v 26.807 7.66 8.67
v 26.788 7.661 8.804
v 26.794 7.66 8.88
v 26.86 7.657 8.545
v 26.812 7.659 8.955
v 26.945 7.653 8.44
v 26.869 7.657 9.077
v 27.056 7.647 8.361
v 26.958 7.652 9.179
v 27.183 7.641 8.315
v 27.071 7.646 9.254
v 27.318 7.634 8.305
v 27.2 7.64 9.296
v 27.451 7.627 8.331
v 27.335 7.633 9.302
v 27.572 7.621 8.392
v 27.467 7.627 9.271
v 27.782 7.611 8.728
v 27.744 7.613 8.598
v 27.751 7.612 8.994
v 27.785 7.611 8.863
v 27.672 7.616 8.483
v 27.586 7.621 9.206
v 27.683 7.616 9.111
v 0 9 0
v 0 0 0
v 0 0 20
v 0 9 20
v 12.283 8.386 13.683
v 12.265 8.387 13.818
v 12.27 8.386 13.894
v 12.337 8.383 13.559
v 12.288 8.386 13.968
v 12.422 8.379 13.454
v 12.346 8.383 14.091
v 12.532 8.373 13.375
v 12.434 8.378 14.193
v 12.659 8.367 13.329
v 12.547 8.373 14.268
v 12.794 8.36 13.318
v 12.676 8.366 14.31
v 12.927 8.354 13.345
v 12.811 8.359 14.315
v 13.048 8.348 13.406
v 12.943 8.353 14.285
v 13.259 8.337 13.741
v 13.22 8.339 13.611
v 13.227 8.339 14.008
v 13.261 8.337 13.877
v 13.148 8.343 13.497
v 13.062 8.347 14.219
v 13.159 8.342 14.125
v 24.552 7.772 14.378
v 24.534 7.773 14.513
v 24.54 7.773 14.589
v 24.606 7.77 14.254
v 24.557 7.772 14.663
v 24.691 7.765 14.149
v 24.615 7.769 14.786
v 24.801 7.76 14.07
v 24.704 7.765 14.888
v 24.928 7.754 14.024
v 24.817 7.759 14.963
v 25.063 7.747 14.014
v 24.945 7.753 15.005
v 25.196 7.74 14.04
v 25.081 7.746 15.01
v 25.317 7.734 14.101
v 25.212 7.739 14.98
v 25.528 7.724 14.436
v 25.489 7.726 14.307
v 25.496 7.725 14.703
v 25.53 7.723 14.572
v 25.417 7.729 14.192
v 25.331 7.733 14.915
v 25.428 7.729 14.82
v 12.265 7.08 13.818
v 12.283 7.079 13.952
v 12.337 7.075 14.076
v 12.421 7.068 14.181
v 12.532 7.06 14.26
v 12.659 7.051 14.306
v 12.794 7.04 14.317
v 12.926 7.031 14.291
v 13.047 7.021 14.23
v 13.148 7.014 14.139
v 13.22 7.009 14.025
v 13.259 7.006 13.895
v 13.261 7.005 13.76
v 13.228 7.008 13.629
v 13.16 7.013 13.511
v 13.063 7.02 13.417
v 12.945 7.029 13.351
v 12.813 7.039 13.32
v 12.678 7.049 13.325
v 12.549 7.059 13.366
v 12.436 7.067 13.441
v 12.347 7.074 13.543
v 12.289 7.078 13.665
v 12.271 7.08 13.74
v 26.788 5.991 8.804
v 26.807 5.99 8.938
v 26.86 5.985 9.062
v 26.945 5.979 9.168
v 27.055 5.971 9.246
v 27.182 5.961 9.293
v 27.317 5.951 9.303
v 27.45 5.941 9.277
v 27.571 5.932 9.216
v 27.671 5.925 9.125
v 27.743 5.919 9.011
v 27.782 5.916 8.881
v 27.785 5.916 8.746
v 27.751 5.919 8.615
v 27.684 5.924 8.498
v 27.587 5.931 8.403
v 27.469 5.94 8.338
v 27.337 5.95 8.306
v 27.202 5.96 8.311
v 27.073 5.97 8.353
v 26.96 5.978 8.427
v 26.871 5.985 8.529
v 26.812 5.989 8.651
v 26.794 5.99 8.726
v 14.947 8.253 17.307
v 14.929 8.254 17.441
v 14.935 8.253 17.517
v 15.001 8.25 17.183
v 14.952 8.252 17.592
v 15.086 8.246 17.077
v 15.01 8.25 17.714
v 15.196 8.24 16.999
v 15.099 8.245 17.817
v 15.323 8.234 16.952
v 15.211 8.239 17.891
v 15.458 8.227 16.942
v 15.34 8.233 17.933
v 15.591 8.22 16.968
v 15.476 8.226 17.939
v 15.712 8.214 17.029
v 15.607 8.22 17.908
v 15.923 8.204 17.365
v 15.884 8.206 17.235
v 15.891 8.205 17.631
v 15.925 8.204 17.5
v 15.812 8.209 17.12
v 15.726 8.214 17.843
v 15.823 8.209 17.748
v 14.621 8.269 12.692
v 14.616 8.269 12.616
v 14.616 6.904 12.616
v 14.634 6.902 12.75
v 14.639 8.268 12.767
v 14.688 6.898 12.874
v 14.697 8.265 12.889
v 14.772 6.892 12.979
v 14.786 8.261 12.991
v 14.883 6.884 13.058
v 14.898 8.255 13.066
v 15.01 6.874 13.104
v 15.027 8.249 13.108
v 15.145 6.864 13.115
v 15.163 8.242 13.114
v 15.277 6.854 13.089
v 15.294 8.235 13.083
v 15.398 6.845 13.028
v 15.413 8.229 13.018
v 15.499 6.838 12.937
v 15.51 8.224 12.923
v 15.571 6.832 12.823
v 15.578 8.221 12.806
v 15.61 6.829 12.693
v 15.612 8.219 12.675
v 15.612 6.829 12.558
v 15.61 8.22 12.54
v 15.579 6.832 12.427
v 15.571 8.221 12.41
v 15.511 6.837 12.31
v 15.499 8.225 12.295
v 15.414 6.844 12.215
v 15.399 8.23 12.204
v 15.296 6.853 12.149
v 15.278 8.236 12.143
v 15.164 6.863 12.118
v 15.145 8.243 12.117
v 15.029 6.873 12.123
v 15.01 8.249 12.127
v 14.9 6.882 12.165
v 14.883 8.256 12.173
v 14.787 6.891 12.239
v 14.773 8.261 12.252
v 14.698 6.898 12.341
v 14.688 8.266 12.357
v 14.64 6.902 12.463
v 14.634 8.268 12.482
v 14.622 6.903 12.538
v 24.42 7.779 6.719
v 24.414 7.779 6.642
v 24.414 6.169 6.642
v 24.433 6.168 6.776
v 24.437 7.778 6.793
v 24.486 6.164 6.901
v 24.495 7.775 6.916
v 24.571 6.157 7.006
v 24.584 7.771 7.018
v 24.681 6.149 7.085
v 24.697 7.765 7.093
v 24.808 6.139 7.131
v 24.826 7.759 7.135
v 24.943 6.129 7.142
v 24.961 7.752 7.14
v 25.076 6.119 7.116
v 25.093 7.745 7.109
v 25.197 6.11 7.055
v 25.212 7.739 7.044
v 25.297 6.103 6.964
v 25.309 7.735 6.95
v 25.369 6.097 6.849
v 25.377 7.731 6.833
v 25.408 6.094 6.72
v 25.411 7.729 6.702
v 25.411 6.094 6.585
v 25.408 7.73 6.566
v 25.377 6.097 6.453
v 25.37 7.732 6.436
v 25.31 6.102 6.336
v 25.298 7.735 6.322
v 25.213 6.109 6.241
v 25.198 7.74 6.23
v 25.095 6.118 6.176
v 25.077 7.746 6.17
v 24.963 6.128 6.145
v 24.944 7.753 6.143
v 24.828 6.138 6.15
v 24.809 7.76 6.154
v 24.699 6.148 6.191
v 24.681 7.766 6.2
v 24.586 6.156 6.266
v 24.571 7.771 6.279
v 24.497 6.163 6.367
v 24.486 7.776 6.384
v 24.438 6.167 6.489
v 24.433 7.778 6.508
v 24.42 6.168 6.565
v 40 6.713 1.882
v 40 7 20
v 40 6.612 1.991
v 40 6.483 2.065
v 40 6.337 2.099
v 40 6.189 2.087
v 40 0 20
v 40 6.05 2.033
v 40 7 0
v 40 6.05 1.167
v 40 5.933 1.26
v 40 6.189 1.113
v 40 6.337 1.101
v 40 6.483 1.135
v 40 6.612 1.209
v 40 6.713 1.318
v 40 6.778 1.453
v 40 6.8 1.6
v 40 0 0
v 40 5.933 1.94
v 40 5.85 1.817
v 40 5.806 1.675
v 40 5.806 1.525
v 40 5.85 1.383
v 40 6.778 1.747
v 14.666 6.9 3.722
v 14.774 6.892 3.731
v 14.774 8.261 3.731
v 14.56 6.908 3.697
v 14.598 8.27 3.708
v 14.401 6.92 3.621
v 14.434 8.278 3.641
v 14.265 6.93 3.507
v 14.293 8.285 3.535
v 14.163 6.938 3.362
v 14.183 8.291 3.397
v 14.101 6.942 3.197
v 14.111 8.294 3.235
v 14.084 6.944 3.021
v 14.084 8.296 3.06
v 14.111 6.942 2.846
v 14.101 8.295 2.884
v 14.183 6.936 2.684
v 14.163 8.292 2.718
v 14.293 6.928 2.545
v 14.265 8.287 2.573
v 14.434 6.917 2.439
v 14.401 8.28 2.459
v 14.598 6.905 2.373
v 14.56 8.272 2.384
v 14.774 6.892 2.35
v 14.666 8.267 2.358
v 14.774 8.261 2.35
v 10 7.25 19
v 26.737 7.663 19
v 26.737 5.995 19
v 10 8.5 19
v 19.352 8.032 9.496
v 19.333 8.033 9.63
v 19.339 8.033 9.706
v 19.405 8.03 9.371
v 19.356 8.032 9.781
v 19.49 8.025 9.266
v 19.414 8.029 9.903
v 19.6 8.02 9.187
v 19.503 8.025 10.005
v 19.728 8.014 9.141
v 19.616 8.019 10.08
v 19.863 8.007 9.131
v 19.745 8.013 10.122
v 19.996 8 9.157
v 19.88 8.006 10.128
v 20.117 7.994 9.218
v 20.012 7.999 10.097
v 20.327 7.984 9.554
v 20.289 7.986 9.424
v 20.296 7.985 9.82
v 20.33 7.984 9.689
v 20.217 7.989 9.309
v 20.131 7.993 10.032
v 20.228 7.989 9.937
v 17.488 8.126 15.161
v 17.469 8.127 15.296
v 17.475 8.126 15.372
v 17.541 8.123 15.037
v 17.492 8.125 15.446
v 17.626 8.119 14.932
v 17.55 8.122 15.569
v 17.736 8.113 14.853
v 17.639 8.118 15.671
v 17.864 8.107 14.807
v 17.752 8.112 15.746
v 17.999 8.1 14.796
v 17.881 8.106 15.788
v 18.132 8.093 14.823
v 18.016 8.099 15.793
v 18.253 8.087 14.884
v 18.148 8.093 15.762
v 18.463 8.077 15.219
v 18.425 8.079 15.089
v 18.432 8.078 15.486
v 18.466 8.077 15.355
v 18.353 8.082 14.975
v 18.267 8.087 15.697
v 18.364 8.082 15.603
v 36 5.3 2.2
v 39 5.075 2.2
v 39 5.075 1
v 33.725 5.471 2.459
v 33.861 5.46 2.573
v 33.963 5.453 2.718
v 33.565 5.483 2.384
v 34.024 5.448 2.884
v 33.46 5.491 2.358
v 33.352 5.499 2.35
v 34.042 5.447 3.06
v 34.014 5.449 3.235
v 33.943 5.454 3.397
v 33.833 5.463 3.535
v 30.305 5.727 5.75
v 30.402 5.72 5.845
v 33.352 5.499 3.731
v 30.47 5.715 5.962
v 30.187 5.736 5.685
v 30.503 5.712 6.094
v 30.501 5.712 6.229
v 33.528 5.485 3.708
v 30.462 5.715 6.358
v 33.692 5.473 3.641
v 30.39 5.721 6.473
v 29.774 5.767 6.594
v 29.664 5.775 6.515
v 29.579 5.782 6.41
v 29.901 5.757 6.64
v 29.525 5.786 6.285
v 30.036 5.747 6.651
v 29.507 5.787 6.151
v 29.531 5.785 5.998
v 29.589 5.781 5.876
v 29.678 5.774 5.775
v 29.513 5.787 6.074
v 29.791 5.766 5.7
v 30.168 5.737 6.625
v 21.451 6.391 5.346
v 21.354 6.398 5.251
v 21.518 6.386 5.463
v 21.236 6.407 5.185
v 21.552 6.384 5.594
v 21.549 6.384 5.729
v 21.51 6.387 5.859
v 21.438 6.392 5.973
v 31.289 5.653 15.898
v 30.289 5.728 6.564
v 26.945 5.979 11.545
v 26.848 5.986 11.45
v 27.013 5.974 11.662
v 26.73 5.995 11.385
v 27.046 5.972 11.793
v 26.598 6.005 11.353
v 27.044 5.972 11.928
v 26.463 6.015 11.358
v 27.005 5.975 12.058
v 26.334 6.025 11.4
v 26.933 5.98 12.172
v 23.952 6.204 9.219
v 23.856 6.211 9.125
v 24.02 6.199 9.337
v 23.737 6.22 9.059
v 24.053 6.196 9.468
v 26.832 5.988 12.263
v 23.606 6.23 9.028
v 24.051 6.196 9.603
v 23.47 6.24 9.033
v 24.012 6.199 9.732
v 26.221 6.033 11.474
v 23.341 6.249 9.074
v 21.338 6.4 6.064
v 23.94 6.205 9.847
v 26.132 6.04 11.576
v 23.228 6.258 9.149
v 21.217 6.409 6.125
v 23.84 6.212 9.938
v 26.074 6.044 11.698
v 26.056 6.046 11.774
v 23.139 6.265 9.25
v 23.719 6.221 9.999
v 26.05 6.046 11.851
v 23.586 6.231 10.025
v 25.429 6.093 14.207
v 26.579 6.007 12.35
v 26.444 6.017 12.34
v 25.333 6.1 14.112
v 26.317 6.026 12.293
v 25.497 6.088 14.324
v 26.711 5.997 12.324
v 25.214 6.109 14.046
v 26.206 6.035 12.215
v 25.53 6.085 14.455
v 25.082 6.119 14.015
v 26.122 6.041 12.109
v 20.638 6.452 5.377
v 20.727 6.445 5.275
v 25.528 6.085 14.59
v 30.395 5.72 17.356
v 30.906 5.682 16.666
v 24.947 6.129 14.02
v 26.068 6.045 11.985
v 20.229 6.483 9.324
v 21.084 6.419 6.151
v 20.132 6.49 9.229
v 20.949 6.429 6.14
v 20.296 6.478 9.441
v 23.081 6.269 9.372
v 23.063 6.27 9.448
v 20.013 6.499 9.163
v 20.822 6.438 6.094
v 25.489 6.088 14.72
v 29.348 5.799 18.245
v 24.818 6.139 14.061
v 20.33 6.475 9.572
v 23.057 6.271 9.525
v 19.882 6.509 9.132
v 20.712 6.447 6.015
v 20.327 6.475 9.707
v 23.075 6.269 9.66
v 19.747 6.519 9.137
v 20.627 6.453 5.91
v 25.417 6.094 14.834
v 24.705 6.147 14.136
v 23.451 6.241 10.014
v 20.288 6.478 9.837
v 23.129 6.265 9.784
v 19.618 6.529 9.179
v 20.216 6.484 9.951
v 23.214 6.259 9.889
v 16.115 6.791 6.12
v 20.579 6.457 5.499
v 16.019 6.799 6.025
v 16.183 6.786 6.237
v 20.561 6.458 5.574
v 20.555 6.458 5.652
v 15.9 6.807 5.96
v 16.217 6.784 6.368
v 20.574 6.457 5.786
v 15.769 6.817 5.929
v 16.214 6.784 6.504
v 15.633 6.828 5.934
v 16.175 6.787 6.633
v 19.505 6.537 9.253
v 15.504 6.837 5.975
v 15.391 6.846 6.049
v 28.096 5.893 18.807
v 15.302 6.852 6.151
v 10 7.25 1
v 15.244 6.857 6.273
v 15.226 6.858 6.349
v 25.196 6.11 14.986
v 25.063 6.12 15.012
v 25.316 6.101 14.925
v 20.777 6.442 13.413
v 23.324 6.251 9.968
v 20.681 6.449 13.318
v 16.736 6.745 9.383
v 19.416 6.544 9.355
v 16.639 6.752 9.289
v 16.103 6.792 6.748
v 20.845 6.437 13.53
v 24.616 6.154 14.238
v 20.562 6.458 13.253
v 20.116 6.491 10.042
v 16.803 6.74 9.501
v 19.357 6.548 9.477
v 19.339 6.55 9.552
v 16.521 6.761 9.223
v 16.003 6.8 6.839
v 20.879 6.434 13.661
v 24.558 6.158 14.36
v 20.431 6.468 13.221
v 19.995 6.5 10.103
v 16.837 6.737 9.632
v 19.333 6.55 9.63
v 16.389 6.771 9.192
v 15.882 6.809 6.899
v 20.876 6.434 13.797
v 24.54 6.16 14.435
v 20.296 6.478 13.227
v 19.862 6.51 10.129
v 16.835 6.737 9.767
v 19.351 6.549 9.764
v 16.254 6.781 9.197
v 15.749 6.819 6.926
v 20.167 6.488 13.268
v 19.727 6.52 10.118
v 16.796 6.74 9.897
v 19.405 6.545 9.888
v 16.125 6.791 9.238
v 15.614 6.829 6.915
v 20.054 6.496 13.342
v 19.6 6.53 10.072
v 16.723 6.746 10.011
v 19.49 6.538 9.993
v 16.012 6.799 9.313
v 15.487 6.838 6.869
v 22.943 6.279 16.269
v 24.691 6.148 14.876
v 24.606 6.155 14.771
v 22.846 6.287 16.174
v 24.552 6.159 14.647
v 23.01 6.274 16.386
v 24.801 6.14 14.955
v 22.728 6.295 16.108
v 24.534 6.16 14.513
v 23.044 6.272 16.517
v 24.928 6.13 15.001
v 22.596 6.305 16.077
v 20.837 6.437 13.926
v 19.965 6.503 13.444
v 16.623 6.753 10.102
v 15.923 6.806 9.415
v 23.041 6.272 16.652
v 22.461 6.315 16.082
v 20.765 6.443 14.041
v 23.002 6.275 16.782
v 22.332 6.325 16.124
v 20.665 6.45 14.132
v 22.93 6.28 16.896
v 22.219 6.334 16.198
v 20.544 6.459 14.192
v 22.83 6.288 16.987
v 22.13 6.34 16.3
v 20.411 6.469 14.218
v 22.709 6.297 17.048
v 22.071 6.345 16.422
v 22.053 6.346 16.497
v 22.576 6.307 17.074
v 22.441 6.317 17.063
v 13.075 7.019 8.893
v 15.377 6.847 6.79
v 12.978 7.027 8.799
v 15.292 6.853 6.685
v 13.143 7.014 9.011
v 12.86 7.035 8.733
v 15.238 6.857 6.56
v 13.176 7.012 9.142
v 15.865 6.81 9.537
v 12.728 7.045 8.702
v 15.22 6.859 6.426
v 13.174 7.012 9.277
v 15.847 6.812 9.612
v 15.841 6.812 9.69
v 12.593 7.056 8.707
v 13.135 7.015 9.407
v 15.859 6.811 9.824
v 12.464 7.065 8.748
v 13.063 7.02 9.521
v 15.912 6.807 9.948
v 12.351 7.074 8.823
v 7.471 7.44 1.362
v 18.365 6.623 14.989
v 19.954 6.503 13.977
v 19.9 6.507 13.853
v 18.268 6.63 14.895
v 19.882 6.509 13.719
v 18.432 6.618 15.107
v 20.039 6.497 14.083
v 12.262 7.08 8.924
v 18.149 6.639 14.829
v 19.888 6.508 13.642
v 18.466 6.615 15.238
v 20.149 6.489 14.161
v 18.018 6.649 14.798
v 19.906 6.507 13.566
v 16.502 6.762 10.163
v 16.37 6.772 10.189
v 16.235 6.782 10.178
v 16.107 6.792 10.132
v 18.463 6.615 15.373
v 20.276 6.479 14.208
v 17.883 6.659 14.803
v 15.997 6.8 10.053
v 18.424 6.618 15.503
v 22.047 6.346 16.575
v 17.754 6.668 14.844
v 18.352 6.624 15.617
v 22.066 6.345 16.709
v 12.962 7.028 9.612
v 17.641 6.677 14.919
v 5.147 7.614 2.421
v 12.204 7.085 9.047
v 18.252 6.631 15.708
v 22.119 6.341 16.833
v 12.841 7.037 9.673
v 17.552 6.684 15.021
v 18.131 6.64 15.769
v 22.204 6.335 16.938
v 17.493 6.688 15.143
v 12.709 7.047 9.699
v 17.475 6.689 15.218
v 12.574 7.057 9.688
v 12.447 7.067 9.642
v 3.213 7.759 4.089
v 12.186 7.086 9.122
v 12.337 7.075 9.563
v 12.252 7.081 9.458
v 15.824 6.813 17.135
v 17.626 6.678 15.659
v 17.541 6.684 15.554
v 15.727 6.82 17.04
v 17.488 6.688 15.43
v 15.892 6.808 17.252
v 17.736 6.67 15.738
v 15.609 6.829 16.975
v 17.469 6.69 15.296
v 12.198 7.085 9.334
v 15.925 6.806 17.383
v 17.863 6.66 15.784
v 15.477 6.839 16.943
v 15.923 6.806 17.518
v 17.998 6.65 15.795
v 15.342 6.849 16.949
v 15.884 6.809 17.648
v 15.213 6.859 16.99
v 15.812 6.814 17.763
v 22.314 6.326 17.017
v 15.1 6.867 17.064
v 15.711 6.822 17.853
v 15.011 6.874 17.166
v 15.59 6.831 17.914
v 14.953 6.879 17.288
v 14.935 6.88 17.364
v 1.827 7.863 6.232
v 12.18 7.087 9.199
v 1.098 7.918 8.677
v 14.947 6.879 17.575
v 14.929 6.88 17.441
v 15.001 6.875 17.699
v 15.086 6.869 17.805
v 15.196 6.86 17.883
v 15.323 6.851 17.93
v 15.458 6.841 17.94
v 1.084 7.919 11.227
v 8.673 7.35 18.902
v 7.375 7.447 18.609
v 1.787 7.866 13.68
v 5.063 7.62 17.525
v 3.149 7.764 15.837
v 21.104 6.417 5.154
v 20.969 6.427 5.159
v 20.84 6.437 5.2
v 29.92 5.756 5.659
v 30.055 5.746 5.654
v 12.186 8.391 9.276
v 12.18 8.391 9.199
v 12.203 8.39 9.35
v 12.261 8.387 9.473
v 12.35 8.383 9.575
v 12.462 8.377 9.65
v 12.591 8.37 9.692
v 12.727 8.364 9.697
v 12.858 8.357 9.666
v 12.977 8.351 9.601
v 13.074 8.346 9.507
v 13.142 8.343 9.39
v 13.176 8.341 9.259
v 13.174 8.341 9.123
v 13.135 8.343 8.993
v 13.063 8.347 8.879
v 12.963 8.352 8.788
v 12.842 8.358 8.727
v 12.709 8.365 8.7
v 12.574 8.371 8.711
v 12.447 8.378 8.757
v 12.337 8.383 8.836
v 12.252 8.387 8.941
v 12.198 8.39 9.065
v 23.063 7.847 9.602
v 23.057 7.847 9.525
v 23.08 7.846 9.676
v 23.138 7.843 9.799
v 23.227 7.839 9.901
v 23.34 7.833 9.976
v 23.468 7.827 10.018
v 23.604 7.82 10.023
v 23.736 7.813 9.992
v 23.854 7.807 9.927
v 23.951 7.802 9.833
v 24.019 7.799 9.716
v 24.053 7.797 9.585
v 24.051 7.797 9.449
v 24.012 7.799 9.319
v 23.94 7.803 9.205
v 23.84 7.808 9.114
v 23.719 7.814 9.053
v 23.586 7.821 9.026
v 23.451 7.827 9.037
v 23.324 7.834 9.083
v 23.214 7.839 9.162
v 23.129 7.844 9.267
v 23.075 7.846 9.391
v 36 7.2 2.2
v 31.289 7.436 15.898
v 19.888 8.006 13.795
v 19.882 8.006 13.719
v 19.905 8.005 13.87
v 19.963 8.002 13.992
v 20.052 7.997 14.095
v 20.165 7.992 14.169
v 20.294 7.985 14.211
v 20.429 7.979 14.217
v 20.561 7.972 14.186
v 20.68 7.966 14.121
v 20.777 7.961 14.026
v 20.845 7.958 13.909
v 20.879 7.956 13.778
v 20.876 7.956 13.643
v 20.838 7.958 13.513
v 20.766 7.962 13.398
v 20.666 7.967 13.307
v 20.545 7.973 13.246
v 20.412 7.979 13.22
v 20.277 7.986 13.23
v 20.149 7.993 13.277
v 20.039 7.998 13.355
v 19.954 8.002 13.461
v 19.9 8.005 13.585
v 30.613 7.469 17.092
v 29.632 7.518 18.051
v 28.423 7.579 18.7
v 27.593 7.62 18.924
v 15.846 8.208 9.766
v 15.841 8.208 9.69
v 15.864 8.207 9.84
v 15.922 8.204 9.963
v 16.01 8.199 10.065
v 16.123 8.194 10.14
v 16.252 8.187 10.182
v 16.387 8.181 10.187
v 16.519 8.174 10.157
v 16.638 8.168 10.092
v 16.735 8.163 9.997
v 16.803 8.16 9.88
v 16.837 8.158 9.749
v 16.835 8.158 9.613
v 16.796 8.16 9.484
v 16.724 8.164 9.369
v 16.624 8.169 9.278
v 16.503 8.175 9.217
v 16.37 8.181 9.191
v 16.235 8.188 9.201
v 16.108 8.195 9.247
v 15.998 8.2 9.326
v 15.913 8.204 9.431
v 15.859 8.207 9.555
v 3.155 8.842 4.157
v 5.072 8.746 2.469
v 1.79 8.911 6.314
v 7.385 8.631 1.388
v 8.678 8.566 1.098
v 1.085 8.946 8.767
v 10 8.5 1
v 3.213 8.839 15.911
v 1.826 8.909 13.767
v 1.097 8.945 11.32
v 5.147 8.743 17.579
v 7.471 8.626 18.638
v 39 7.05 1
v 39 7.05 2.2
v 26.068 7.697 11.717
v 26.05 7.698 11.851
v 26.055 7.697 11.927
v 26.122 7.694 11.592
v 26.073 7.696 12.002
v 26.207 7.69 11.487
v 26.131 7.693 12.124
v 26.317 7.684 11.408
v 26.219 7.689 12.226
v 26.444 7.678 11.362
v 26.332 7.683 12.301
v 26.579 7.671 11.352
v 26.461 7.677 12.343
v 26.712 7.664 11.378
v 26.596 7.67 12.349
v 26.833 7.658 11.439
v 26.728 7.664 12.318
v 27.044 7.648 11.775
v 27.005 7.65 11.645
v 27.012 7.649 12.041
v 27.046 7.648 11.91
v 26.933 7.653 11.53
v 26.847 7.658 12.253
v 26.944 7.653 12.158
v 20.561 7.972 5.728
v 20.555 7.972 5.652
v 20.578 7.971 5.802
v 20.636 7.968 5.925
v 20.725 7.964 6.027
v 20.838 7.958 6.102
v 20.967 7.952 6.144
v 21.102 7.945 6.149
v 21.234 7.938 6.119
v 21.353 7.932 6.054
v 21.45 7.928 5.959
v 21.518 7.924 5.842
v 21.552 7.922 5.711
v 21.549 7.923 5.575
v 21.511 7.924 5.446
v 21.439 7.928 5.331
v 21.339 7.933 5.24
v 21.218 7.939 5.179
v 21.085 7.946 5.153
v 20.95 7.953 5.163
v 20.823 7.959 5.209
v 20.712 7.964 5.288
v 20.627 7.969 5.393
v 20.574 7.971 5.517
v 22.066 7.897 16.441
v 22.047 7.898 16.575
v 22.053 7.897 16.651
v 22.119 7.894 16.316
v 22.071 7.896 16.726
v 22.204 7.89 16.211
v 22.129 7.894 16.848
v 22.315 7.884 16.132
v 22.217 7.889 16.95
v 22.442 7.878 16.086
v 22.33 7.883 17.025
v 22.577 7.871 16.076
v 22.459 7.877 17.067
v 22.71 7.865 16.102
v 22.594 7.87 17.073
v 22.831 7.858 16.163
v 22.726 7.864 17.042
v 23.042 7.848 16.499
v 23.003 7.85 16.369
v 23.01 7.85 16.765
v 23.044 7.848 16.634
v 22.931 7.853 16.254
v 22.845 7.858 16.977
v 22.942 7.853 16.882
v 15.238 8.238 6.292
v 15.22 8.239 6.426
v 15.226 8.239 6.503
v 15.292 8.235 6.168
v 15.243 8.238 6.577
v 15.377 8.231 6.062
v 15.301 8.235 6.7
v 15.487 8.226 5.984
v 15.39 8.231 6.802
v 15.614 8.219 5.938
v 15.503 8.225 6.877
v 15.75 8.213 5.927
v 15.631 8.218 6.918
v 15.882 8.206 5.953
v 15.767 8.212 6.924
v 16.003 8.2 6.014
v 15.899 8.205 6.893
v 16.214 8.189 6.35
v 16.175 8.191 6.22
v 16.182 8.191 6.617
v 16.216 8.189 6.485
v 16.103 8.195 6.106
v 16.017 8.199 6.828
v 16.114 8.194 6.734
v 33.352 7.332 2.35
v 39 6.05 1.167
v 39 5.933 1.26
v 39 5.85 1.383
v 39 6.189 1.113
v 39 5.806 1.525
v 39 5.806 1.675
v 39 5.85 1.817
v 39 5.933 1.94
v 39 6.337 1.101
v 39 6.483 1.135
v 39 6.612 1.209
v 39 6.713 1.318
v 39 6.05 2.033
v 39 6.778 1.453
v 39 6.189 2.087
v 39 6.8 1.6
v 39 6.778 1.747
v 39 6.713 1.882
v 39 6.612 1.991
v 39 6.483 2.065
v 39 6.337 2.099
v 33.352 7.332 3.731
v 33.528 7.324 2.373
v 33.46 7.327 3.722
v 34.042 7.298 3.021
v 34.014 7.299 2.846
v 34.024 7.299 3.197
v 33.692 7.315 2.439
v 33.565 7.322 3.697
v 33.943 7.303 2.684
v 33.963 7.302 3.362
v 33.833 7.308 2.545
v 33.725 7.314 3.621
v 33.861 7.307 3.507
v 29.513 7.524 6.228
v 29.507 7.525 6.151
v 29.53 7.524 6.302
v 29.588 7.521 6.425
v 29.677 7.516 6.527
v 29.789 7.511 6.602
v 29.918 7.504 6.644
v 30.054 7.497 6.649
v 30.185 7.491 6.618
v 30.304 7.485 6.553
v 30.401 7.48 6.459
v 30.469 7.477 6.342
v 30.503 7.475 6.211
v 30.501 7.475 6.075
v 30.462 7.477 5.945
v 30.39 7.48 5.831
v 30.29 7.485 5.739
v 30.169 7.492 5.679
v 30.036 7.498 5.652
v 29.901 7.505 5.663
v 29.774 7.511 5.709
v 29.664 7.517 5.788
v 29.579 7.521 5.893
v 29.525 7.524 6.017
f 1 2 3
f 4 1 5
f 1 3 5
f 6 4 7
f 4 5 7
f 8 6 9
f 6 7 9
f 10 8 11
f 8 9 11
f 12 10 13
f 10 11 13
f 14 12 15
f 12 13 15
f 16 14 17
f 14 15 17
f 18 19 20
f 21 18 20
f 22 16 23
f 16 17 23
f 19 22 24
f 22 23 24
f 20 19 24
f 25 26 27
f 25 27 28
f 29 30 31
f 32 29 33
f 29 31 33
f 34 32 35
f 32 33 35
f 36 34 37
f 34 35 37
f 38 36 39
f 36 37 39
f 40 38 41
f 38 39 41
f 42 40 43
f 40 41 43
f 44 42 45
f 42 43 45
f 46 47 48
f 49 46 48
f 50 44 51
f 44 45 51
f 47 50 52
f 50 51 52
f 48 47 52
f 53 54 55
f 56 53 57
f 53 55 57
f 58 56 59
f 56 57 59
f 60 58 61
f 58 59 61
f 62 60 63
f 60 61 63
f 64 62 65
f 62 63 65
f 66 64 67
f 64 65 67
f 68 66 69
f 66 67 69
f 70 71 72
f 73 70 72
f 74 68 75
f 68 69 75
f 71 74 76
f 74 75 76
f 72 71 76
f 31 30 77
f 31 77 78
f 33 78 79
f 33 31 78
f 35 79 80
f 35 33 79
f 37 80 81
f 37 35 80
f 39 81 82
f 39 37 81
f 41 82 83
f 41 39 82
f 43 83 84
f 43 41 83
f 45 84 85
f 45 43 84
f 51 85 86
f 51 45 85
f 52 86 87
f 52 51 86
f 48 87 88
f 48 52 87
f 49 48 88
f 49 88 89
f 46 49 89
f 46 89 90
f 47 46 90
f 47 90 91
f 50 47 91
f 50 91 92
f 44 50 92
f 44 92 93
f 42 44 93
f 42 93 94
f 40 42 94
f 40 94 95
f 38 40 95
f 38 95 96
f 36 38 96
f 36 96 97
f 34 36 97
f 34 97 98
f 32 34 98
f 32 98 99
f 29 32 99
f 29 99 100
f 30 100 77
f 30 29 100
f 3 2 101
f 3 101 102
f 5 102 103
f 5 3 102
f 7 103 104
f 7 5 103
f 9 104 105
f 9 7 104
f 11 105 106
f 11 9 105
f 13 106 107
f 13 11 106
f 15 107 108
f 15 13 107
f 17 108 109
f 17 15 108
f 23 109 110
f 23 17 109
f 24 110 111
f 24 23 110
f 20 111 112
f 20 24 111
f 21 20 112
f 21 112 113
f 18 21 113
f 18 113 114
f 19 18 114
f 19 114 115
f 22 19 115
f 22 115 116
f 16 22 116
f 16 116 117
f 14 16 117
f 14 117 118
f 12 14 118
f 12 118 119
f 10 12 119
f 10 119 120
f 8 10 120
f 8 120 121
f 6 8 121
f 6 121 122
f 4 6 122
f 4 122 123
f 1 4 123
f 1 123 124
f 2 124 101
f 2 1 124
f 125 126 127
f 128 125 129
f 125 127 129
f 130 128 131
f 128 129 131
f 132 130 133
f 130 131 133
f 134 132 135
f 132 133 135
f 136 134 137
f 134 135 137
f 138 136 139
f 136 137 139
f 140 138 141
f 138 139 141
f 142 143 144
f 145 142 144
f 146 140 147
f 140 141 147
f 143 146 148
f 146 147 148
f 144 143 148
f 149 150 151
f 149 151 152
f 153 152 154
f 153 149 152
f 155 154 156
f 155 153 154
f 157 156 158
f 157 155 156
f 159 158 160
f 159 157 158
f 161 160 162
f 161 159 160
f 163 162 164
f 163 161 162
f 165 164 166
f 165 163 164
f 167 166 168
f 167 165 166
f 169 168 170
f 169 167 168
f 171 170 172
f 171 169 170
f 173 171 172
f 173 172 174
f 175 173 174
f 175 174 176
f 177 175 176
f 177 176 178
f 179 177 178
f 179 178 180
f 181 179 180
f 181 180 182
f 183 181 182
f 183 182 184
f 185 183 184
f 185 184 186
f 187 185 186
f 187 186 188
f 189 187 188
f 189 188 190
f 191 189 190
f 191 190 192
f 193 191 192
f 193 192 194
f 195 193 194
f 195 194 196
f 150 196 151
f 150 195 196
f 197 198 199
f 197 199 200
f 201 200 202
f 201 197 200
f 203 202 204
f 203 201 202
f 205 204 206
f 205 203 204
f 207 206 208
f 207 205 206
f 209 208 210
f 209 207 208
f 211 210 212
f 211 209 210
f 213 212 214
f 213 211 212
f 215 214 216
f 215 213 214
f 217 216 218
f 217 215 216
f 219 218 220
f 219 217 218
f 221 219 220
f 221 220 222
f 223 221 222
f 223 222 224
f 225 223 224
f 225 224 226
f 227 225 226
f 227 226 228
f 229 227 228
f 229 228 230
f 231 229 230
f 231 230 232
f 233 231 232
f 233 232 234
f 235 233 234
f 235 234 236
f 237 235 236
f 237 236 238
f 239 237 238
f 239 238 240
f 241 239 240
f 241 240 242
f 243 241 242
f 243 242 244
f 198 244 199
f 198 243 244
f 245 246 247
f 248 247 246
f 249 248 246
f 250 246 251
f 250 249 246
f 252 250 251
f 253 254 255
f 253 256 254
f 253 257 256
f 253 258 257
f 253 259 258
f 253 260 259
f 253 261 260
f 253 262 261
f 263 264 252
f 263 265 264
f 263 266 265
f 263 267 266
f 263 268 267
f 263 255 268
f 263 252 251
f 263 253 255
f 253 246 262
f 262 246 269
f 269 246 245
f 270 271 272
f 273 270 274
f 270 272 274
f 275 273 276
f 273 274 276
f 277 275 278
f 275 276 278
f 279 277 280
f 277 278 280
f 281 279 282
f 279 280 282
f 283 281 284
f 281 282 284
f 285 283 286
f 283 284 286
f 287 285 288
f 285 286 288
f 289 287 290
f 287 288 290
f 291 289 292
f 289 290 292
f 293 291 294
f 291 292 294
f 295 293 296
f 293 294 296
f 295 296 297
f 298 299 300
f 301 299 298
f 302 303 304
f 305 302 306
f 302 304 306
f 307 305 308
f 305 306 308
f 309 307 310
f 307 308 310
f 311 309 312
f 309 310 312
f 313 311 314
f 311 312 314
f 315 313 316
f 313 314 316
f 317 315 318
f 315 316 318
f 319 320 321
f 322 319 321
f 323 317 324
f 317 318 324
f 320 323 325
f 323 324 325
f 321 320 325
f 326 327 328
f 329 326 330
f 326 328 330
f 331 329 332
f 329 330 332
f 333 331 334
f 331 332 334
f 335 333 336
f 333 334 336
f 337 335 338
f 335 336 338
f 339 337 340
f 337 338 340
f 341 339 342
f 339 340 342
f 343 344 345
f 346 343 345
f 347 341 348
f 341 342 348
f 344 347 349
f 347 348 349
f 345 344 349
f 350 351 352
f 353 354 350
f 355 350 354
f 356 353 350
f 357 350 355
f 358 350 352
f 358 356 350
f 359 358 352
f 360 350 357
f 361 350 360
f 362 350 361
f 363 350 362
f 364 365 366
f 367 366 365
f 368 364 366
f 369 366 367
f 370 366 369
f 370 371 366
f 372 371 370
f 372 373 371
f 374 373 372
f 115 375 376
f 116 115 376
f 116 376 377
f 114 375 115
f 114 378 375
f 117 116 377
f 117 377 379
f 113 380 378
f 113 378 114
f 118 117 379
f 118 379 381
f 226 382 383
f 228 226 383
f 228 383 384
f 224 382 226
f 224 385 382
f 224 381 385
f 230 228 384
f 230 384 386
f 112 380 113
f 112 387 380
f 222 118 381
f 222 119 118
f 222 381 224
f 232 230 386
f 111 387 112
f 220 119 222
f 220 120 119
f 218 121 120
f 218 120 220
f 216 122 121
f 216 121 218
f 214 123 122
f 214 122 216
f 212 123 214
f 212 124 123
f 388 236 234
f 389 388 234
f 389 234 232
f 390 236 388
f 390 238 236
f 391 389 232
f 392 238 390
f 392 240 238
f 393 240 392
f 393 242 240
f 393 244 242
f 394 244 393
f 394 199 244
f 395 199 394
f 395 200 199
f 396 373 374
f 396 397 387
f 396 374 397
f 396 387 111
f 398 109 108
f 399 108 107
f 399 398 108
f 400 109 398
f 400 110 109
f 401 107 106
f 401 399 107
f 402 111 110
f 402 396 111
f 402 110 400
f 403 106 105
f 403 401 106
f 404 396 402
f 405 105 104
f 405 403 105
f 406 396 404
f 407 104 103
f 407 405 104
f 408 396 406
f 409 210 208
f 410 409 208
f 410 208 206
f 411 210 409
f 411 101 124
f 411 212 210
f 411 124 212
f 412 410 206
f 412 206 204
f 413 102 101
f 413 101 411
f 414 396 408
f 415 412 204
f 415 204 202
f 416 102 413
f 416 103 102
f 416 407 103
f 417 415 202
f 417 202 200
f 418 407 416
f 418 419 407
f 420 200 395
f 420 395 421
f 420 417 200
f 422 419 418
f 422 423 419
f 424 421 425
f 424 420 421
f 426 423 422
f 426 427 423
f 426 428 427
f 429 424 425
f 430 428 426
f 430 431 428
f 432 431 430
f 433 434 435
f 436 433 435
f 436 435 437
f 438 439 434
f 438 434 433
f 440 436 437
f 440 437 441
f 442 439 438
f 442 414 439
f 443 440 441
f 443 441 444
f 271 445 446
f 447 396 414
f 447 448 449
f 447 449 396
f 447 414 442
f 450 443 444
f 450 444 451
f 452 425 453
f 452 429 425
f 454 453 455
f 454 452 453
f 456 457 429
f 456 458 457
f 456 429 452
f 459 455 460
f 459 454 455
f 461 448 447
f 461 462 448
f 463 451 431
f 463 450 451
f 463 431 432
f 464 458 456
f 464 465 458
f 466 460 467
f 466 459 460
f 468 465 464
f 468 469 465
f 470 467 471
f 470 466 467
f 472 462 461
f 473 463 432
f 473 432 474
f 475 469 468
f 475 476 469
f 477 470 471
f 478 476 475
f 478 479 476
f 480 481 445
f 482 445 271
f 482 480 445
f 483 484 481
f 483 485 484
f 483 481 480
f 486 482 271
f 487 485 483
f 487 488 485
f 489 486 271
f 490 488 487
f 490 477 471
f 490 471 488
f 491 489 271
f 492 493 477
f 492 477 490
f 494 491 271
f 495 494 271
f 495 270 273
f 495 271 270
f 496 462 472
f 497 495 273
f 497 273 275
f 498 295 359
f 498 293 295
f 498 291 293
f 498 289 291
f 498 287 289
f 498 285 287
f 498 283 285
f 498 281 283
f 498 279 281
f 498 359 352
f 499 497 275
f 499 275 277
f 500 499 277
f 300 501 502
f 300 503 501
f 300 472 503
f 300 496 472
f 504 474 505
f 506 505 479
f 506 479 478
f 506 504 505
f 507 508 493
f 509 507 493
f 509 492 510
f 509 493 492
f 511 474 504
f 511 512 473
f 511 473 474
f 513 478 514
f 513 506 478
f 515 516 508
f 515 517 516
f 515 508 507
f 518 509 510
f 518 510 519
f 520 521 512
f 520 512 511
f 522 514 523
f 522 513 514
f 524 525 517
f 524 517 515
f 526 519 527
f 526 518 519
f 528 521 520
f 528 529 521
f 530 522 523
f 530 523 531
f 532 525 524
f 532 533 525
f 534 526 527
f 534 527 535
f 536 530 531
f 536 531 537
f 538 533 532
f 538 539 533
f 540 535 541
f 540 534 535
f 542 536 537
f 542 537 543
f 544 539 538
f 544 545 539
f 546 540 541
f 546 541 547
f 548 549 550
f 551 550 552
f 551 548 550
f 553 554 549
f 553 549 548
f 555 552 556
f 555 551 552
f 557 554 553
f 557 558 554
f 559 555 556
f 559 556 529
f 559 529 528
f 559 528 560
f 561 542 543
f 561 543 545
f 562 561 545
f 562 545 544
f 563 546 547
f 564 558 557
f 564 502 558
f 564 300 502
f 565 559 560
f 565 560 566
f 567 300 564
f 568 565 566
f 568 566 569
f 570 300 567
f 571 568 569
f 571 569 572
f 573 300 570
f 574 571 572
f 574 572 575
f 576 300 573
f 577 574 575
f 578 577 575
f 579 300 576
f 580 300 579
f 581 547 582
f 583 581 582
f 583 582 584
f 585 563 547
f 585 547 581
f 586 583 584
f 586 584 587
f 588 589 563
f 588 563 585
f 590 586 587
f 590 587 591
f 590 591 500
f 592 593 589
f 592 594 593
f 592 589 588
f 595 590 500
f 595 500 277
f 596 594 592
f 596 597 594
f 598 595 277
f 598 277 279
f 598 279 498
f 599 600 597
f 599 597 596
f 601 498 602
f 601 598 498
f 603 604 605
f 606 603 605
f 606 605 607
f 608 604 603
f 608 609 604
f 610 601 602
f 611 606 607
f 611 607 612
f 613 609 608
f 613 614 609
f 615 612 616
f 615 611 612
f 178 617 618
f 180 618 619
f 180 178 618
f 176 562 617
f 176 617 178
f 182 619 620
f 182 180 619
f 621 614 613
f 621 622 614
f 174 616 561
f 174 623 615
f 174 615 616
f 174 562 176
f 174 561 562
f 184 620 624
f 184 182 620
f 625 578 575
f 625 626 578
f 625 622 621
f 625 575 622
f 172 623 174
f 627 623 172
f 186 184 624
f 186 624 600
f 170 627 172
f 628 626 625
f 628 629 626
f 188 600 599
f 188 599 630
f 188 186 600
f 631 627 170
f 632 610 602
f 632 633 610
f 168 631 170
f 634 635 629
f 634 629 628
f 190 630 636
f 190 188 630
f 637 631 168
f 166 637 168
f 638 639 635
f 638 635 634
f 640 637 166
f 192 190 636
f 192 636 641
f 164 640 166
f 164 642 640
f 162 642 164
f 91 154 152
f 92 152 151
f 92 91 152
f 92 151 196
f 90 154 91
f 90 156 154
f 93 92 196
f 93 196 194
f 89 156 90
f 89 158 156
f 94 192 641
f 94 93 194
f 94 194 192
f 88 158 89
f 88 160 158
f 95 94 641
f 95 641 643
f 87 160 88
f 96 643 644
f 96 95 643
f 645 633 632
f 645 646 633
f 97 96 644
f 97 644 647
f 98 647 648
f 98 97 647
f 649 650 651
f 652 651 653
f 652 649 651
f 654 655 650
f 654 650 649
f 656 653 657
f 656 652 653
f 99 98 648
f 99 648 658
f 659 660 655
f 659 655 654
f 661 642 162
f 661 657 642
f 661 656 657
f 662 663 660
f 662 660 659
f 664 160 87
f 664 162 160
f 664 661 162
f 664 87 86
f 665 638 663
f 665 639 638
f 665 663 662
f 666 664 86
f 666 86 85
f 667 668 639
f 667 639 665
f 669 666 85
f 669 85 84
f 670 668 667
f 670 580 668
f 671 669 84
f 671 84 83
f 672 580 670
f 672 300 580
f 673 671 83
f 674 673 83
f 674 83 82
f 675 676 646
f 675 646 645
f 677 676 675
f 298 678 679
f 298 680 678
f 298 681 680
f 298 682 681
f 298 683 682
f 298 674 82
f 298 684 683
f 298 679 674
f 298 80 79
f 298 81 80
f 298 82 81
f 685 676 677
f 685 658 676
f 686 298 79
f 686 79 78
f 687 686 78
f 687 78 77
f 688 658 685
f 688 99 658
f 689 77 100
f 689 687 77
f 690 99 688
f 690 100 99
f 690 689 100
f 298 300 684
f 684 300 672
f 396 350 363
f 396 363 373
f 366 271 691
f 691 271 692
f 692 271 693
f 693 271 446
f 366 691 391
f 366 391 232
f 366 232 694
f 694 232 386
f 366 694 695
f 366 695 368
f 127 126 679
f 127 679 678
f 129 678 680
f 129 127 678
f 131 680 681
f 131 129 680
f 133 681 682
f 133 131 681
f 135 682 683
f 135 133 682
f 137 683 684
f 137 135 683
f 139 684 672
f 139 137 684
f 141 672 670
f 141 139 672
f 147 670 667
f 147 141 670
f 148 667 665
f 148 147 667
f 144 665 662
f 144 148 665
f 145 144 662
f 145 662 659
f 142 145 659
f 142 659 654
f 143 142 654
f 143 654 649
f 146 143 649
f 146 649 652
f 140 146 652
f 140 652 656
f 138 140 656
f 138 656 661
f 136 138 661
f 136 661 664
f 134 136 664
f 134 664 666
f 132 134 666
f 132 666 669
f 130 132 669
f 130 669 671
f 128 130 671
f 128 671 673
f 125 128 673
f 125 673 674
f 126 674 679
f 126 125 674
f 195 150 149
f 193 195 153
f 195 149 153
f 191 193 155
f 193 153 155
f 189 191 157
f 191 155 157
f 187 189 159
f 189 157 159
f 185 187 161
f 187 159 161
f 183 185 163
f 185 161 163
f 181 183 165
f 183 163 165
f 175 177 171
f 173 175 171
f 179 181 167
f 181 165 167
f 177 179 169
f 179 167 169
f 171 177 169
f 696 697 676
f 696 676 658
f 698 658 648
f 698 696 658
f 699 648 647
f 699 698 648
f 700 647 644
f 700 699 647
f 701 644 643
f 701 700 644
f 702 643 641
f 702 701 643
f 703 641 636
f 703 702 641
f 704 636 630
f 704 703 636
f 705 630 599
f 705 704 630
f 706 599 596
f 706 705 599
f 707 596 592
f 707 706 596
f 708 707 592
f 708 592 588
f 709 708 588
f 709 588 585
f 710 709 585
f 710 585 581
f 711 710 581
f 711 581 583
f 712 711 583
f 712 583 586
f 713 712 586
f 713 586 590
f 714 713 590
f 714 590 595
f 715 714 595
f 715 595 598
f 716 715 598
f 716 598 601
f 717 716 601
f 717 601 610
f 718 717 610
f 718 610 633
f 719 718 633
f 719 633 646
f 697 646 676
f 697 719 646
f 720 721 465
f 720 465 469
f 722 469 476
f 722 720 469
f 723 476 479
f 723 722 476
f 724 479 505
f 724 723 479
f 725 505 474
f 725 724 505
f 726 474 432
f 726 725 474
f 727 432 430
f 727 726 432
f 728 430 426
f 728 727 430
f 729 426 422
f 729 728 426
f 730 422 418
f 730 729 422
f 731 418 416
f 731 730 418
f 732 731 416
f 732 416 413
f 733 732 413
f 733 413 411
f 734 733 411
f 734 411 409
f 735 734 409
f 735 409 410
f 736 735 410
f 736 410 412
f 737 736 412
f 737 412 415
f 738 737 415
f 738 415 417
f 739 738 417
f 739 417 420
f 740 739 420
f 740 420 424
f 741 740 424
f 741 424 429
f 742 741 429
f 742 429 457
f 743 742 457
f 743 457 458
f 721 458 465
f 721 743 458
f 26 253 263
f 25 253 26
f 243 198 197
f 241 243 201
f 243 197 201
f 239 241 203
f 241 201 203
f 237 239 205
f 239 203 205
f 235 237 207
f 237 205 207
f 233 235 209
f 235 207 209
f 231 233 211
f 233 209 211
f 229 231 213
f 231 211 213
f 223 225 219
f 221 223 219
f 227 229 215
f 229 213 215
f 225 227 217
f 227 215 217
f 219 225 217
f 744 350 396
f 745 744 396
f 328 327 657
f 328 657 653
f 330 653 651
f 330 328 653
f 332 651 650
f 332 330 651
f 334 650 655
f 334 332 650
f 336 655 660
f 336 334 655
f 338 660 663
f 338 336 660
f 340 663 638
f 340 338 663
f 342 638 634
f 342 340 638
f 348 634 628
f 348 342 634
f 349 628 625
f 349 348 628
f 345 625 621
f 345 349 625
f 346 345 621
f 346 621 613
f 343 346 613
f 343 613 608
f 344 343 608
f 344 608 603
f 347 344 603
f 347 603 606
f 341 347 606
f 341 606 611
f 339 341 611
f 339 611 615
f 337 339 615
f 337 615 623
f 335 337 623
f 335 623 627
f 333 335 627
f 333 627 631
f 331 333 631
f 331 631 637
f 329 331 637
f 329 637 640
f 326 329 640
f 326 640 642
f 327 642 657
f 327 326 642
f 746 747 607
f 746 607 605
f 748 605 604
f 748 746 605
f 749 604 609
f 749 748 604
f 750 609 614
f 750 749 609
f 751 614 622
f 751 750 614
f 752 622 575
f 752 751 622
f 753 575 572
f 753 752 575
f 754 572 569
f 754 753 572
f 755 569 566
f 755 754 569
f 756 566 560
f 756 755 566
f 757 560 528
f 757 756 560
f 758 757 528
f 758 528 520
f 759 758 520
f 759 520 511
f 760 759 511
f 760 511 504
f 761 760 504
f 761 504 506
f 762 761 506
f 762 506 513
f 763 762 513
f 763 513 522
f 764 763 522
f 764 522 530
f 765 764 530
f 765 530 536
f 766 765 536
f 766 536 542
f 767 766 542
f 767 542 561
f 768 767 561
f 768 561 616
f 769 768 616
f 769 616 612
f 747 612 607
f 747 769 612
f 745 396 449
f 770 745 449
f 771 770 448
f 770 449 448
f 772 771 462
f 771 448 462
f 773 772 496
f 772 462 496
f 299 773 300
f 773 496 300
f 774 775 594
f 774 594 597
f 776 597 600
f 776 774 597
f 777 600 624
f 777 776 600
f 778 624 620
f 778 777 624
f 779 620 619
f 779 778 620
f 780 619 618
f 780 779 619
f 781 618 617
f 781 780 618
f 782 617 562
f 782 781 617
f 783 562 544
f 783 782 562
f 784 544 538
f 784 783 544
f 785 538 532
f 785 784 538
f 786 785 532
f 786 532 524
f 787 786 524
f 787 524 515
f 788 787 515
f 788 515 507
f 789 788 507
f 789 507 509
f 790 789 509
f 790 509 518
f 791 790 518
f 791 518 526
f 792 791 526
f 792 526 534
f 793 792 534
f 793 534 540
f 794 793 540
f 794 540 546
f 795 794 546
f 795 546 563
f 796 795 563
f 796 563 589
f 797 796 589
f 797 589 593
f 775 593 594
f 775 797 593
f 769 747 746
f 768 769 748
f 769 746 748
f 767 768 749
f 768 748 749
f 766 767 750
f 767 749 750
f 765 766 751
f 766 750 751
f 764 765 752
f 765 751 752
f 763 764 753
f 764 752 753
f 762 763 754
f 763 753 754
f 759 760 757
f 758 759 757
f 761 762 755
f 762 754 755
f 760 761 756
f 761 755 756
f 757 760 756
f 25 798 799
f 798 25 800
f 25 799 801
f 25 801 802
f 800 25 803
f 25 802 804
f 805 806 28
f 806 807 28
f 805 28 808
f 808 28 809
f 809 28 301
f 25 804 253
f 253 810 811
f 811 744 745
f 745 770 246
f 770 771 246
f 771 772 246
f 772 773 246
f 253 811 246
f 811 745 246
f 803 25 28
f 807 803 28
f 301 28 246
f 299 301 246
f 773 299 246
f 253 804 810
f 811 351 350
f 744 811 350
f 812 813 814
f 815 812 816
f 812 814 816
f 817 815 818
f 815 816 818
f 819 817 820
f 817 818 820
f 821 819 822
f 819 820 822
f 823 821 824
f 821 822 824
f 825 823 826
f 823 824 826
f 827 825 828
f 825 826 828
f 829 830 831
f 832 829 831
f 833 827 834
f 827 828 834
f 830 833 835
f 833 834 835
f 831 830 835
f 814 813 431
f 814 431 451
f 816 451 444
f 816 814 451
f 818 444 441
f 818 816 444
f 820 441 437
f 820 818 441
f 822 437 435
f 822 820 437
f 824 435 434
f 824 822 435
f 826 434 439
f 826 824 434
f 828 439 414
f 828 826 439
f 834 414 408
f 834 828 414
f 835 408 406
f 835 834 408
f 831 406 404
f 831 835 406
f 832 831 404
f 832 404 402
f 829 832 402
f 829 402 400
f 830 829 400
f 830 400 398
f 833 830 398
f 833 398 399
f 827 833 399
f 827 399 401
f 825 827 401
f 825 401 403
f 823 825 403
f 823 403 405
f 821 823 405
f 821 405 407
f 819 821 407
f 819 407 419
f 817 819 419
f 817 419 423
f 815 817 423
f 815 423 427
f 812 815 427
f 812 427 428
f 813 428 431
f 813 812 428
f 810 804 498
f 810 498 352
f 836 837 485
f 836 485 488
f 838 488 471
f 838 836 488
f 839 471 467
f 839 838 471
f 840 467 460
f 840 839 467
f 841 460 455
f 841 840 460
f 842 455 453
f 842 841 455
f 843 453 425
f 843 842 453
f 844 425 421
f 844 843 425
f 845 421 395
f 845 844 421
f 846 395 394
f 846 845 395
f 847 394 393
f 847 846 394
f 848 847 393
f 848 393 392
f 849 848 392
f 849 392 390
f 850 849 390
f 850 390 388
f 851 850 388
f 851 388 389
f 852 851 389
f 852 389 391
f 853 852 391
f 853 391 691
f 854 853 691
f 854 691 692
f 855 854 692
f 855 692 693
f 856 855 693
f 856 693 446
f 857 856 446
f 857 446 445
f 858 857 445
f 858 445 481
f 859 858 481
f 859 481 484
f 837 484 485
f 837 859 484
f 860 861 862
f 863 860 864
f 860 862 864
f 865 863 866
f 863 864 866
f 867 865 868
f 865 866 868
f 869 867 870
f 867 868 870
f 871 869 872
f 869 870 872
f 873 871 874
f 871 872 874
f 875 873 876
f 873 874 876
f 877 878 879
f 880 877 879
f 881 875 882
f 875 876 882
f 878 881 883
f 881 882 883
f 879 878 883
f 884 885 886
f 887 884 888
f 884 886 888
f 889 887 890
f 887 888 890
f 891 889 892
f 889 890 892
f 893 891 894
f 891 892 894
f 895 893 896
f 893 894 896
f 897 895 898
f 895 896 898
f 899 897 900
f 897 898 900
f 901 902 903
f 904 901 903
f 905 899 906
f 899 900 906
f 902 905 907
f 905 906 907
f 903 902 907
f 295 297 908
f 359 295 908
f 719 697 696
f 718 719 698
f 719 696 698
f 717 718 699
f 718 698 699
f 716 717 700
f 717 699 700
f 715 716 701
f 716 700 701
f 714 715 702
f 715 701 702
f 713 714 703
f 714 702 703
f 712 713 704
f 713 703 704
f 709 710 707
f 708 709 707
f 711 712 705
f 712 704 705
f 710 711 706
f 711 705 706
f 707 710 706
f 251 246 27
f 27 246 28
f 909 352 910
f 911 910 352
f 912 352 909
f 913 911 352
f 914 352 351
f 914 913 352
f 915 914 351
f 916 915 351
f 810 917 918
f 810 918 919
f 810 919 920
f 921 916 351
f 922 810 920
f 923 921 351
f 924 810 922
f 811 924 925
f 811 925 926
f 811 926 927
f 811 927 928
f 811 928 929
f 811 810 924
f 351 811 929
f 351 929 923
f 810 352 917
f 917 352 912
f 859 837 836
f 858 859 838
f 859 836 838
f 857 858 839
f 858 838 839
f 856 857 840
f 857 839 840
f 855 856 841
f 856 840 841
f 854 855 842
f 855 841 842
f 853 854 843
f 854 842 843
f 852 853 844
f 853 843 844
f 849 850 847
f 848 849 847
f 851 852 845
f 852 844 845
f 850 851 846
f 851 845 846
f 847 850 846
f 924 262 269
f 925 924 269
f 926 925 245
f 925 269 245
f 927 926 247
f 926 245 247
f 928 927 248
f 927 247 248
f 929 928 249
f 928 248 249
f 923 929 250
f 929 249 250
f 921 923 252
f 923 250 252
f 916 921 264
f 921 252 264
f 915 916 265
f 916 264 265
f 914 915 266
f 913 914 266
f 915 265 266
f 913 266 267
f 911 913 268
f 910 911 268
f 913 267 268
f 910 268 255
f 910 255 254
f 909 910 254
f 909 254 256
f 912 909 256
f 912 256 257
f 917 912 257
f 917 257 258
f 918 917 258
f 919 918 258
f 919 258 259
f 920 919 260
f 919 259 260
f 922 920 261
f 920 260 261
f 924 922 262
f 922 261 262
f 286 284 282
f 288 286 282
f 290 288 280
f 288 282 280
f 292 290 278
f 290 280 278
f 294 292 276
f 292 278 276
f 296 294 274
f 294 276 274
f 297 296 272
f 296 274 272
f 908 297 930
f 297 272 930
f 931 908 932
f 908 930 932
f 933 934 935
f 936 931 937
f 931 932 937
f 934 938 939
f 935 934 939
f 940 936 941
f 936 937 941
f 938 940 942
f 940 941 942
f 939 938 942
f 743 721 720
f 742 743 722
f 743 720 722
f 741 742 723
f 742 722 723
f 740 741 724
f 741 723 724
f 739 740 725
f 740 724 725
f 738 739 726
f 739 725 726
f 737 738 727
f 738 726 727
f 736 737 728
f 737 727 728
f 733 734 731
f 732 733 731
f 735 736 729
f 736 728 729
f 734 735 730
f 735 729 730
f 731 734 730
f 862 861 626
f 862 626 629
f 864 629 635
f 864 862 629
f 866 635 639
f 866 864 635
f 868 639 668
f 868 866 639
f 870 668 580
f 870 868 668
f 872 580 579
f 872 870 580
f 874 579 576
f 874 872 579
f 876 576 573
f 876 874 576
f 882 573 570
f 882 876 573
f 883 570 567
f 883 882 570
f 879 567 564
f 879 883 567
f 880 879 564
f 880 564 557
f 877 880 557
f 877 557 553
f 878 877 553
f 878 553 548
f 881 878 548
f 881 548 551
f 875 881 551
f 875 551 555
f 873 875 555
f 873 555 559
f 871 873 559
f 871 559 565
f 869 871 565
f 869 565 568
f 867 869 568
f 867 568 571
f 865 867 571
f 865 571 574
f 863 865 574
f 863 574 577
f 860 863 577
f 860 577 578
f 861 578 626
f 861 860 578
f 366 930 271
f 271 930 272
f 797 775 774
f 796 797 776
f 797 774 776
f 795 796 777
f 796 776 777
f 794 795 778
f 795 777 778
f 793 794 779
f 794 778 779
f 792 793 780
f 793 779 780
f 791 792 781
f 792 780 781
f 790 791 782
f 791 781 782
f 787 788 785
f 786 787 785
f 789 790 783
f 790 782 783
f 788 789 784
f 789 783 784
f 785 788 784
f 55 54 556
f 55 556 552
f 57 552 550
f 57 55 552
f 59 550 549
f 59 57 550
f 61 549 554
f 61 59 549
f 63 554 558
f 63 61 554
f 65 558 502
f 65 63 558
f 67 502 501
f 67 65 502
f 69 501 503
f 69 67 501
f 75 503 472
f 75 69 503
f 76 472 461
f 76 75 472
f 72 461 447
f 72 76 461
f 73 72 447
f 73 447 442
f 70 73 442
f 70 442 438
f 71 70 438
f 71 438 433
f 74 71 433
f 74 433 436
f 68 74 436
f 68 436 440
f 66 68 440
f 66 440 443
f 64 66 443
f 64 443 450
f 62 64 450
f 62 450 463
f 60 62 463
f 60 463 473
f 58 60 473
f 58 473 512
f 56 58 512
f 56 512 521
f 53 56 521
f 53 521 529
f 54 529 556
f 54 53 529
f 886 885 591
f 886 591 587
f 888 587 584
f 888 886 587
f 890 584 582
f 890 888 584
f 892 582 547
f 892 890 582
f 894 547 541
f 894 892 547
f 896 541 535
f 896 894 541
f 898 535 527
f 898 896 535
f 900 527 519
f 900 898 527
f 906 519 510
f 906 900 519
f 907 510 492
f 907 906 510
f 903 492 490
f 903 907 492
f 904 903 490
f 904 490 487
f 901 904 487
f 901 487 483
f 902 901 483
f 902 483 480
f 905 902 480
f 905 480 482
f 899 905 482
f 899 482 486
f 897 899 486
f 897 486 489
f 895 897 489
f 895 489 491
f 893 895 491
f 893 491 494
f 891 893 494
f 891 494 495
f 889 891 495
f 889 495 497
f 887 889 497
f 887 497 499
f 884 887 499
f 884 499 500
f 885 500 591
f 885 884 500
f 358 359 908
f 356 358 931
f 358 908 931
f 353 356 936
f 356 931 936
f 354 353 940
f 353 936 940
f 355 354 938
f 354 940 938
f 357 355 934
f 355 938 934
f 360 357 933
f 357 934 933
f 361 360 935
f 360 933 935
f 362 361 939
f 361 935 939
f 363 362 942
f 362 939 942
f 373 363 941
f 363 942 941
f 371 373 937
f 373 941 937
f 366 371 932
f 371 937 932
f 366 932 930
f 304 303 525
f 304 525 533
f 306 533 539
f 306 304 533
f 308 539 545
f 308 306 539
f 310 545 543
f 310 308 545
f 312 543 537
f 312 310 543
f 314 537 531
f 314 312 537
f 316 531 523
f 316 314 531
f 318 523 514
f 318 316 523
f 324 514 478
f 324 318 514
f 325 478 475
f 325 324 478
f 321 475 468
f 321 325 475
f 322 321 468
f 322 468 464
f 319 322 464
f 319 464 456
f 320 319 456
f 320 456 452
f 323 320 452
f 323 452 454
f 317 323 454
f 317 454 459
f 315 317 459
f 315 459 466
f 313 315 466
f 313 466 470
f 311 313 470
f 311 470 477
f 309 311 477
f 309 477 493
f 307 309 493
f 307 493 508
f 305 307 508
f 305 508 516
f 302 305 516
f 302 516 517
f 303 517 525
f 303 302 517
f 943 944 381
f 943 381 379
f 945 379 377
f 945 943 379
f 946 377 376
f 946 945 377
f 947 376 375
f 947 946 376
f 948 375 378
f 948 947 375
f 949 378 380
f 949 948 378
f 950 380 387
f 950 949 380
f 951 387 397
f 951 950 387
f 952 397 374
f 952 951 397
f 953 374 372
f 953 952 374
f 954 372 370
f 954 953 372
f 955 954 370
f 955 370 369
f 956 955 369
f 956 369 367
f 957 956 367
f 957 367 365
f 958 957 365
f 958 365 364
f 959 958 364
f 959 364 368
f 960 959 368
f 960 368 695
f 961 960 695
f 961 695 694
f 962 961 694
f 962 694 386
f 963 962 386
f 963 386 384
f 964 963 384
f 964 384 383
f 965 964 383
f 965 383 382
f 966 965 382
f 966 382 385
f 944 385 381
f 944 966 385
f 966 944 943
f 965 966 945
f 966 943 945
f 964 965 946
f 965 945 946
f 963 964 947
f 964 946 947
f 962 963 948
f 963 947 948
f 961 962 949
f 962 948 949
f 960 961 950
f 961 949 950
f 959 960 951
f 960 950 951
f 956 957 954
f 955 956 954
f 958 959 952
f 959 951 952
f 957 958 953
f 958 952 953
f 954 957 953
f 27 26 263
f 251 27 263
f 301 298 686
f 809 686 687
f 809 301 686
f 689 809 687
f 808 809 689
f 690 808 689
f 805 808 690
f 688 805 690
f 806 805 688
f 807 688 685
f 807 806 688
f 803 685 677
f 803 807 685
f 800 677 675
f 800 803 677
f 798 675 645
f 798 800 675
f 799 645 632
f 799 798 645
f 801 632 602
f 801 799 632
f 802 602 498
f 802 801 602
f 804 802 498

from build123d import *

# Parameters (mm, degrees)
EXTRUDE_1_DEPTH      = 20
CUT_EXTRUDE_START    = 20
SKETCH_4_R           = 0.5
CUT_EXTRUDE_6_DEPTH  = 15
EXTRUDE_2_DEPTH      = 10
EXTRUDE_3_DEPTH      = 20
CUT_EXTRUDE_7_DEPTH  = 20
SKETCH_12_R          = 0.5
CUT_EXTRUDE_10_DEPTH = 20
CUT_EXTRUDE_15_DEPTH = 20
SKETCH_15_R          = 0.5
CUT_EXTRUDE_16_DEPTH = 1


with BuildPart() as part:
    # 草圖2 → 填料-伸長1 (new body)
    with BuildSketch(Plane.XY):
        Polygon((0, 0), (0, 20), (40, 15), (40, 0), align=None)
    extrude(amount=EXTRUDE_1_DEPTH)

    # 草圖4 → 除料-伸長6 (cut)
    with BuildSketch(Plane(origin=(1.235539726, 0, 0), x_dir=(1, 0, 0), z_dir=(0, 1, 0)).offset(CUT_EXTRUDE_START)):
        with BuildLine():
            Line((8.764460274, -1), (37.764460274, -1))
            Line((37.764460274, -1), (37.764460274, -19))
            Line((37.764460274, -19), (8.764460274, -19))
            ThreePointArc((8.764460274, -19), (-0.235539726, -10), (8.764460274, -1))
        make_face()
        with Locations((14.484350187, -6.426353647)):
            Circle(SKETCH_4_R, mode=Mode.SUBTRACT)
        with Locations((13.880099762, -12.615834701)):
            Circle(SKETCH_4_R, mode=Mode.SUBTRACT)
        with Locations((18.597641111, -9.629824046)):
            Circle(SKETCH_4_R, mode=Mode.SUBTRACT)
        with Locations((23.67865621, -6.642424392)):
            Circle(SKETCH_4_R, mode=Mode.SUBTRACT)
        with Locations((23.798217352, -14.512669522)):
            Circle(SKETCH_4_R, mode=Mode.SUBTRACT)
        with Locations((19.146558444, -13.71910453)):
            Circle(SKETCH_4_R, mode=Mode.SUBTRACT)
        with Locations((22.321317197, -9.525445181)):
            Circle(SKETCH_4_R, mode=Mode.SUBTRACT)
        with Locations((26.052750908, -8.803862679)):
            Circle(SKETCH_4_R, mode=Mode.SUBTRACT)
        with Locations((25.314084108, -11.850948182)):
            Circle(SKETCH_4_R, mode=Mode.SUBTRACT)
        with Locations((28.771173887, -6.151414905)):
            Circle(SKETCH_4_R, mode=Mode.SUBTRACT)
        with Locations((19.819687009, -5.651663075)):
            Circle(SKETCH_4_R, mode=Mode.SUBTRACT)
        with Locations((11.444186287, -9.199481051)):
            Circle(SKETCH_4_R, mode=Mode.SUBTRACT)
        with Locations((11.529073964, -13.817559785)):
            Circle(SKETCH_4_R, mode=Mode.SUBTRACT)
        with Locations((14.193117081, -17.441077825)):
            Circle(SKETCH_4_R, mode=Mode.SUBTRACT)
        with Locations((16.733650127, -15.295531213)):
            Circle(SKETCH_4_R, mode=Mode.SUBTRACT)
        with Locations((21.311821949, -16.574794778)):
            Circle(SKETCH_4_R, mode=Mode.SUBTRACT)
        with Locations((15.10499253, -9.689628951)):
            Circle(SKETCH_4_R, mode=Mode.SUBTRACT)
        with BuildLine():
            Line((13.53826807, -2.349817412), (32.116451532, -2.349817412))
            ThreePointArc((32.116451532, -2.349817412), (32.806890875, -3.040256756), (32.116451532, -3.730696099))
            Line((32.116451532, -3.730696099), (13.53826807, -3.730696099))
            ThreePointArc((13.53826807, -3.730696099), (12.847828727, -3.040256756), (13.53826807, -2.349817412))
        make_face(mode=Mode.SUBTRACT)
    extrude(amount=-CUT_EXTRUDE_6_DEPTH, mode=Mode.SUBTRACT)

    # 草圖4<5> → 填料-伸長2 (add)
    with BuildSketch(Plane(origin=(1.235539726, 0, 0), x_dir=(1, 0, 0), z_dir=(0, 1, 0))):
        with BuildLine():
            Line((37.764460274, -19), (37.764460274, -2.2))
            Line((37.764460274, -2.2), (34.764460274, -2.2))
            Line((34.764460274, -2.2), (30.053349233, -15.898079159))
            ThreePointArc((30.053349233, -15.898079159), (28.25547142, -18.150801067), (25.501205312, -19))
            Line((25.501205312, -19), (37.764460274, -19))
        make_face()
    extrude(amount=EXTRUDE_2_DEPTH)

    # 草圖9 → 填料-伸長3 (add)
    with BuildSketch(Plane.XY.offset(20)):
        Polygon((0, 0), (40, 0), (40, 5), (0, 8), align=None)
    extrude(amount=-EXTRUDE_3_DEPTH)

    # 草圖11 → 除料-伸長7 (cut)
    with BuildSketch(Plane.XY.offset(20)):
        Polygon((0, 20), (0, 10), (40, 10), (40, 15), align=None)
    extrude(amount=-CUT_EXTRUDE_7_DEPTH, mode=Mode.SUBTRACT)

    # 草圖12 → 除料-伸長10 (cut)
    with BuildSketch(Plane(origin=(40, 0, 0), x_dir=(0, 0, -1), z_dir=(1, 0, 0))):
        with Locations((-1.6, 9)):
            Circle(SKETCH_12_R)
    extrude(amount=-CUT_EXTRUDE_10_DEPTH, mode=Mode.SUBTRACT)

    # 草圖14 → 除料-伸長15 (cut)
    with BuildSketch(Plane.XY.offset(20)):
        Polygon((40, 10), (0, 10), (0, 9), (40, 7), align=None)
    extrude(amount=-CUT_EXTRUDE_15_DEPTH, mode=Mode.SUBTRACT)

    # 草圖15 → 除料-伸長16 (cut)
    with BuildSketch(Plane(origin=(40, 0, 0), x_dir=(0, 0, -1), z_dir=(1, 0, 0))):
        with Locations((-1.6, 6.3)):
            Circle(SKETCH_15_R)
    extrude(amount=-CUT_EXTRUDE_16_DEPTH, mode=Mode.SUBTRACT)


solid = part.part
